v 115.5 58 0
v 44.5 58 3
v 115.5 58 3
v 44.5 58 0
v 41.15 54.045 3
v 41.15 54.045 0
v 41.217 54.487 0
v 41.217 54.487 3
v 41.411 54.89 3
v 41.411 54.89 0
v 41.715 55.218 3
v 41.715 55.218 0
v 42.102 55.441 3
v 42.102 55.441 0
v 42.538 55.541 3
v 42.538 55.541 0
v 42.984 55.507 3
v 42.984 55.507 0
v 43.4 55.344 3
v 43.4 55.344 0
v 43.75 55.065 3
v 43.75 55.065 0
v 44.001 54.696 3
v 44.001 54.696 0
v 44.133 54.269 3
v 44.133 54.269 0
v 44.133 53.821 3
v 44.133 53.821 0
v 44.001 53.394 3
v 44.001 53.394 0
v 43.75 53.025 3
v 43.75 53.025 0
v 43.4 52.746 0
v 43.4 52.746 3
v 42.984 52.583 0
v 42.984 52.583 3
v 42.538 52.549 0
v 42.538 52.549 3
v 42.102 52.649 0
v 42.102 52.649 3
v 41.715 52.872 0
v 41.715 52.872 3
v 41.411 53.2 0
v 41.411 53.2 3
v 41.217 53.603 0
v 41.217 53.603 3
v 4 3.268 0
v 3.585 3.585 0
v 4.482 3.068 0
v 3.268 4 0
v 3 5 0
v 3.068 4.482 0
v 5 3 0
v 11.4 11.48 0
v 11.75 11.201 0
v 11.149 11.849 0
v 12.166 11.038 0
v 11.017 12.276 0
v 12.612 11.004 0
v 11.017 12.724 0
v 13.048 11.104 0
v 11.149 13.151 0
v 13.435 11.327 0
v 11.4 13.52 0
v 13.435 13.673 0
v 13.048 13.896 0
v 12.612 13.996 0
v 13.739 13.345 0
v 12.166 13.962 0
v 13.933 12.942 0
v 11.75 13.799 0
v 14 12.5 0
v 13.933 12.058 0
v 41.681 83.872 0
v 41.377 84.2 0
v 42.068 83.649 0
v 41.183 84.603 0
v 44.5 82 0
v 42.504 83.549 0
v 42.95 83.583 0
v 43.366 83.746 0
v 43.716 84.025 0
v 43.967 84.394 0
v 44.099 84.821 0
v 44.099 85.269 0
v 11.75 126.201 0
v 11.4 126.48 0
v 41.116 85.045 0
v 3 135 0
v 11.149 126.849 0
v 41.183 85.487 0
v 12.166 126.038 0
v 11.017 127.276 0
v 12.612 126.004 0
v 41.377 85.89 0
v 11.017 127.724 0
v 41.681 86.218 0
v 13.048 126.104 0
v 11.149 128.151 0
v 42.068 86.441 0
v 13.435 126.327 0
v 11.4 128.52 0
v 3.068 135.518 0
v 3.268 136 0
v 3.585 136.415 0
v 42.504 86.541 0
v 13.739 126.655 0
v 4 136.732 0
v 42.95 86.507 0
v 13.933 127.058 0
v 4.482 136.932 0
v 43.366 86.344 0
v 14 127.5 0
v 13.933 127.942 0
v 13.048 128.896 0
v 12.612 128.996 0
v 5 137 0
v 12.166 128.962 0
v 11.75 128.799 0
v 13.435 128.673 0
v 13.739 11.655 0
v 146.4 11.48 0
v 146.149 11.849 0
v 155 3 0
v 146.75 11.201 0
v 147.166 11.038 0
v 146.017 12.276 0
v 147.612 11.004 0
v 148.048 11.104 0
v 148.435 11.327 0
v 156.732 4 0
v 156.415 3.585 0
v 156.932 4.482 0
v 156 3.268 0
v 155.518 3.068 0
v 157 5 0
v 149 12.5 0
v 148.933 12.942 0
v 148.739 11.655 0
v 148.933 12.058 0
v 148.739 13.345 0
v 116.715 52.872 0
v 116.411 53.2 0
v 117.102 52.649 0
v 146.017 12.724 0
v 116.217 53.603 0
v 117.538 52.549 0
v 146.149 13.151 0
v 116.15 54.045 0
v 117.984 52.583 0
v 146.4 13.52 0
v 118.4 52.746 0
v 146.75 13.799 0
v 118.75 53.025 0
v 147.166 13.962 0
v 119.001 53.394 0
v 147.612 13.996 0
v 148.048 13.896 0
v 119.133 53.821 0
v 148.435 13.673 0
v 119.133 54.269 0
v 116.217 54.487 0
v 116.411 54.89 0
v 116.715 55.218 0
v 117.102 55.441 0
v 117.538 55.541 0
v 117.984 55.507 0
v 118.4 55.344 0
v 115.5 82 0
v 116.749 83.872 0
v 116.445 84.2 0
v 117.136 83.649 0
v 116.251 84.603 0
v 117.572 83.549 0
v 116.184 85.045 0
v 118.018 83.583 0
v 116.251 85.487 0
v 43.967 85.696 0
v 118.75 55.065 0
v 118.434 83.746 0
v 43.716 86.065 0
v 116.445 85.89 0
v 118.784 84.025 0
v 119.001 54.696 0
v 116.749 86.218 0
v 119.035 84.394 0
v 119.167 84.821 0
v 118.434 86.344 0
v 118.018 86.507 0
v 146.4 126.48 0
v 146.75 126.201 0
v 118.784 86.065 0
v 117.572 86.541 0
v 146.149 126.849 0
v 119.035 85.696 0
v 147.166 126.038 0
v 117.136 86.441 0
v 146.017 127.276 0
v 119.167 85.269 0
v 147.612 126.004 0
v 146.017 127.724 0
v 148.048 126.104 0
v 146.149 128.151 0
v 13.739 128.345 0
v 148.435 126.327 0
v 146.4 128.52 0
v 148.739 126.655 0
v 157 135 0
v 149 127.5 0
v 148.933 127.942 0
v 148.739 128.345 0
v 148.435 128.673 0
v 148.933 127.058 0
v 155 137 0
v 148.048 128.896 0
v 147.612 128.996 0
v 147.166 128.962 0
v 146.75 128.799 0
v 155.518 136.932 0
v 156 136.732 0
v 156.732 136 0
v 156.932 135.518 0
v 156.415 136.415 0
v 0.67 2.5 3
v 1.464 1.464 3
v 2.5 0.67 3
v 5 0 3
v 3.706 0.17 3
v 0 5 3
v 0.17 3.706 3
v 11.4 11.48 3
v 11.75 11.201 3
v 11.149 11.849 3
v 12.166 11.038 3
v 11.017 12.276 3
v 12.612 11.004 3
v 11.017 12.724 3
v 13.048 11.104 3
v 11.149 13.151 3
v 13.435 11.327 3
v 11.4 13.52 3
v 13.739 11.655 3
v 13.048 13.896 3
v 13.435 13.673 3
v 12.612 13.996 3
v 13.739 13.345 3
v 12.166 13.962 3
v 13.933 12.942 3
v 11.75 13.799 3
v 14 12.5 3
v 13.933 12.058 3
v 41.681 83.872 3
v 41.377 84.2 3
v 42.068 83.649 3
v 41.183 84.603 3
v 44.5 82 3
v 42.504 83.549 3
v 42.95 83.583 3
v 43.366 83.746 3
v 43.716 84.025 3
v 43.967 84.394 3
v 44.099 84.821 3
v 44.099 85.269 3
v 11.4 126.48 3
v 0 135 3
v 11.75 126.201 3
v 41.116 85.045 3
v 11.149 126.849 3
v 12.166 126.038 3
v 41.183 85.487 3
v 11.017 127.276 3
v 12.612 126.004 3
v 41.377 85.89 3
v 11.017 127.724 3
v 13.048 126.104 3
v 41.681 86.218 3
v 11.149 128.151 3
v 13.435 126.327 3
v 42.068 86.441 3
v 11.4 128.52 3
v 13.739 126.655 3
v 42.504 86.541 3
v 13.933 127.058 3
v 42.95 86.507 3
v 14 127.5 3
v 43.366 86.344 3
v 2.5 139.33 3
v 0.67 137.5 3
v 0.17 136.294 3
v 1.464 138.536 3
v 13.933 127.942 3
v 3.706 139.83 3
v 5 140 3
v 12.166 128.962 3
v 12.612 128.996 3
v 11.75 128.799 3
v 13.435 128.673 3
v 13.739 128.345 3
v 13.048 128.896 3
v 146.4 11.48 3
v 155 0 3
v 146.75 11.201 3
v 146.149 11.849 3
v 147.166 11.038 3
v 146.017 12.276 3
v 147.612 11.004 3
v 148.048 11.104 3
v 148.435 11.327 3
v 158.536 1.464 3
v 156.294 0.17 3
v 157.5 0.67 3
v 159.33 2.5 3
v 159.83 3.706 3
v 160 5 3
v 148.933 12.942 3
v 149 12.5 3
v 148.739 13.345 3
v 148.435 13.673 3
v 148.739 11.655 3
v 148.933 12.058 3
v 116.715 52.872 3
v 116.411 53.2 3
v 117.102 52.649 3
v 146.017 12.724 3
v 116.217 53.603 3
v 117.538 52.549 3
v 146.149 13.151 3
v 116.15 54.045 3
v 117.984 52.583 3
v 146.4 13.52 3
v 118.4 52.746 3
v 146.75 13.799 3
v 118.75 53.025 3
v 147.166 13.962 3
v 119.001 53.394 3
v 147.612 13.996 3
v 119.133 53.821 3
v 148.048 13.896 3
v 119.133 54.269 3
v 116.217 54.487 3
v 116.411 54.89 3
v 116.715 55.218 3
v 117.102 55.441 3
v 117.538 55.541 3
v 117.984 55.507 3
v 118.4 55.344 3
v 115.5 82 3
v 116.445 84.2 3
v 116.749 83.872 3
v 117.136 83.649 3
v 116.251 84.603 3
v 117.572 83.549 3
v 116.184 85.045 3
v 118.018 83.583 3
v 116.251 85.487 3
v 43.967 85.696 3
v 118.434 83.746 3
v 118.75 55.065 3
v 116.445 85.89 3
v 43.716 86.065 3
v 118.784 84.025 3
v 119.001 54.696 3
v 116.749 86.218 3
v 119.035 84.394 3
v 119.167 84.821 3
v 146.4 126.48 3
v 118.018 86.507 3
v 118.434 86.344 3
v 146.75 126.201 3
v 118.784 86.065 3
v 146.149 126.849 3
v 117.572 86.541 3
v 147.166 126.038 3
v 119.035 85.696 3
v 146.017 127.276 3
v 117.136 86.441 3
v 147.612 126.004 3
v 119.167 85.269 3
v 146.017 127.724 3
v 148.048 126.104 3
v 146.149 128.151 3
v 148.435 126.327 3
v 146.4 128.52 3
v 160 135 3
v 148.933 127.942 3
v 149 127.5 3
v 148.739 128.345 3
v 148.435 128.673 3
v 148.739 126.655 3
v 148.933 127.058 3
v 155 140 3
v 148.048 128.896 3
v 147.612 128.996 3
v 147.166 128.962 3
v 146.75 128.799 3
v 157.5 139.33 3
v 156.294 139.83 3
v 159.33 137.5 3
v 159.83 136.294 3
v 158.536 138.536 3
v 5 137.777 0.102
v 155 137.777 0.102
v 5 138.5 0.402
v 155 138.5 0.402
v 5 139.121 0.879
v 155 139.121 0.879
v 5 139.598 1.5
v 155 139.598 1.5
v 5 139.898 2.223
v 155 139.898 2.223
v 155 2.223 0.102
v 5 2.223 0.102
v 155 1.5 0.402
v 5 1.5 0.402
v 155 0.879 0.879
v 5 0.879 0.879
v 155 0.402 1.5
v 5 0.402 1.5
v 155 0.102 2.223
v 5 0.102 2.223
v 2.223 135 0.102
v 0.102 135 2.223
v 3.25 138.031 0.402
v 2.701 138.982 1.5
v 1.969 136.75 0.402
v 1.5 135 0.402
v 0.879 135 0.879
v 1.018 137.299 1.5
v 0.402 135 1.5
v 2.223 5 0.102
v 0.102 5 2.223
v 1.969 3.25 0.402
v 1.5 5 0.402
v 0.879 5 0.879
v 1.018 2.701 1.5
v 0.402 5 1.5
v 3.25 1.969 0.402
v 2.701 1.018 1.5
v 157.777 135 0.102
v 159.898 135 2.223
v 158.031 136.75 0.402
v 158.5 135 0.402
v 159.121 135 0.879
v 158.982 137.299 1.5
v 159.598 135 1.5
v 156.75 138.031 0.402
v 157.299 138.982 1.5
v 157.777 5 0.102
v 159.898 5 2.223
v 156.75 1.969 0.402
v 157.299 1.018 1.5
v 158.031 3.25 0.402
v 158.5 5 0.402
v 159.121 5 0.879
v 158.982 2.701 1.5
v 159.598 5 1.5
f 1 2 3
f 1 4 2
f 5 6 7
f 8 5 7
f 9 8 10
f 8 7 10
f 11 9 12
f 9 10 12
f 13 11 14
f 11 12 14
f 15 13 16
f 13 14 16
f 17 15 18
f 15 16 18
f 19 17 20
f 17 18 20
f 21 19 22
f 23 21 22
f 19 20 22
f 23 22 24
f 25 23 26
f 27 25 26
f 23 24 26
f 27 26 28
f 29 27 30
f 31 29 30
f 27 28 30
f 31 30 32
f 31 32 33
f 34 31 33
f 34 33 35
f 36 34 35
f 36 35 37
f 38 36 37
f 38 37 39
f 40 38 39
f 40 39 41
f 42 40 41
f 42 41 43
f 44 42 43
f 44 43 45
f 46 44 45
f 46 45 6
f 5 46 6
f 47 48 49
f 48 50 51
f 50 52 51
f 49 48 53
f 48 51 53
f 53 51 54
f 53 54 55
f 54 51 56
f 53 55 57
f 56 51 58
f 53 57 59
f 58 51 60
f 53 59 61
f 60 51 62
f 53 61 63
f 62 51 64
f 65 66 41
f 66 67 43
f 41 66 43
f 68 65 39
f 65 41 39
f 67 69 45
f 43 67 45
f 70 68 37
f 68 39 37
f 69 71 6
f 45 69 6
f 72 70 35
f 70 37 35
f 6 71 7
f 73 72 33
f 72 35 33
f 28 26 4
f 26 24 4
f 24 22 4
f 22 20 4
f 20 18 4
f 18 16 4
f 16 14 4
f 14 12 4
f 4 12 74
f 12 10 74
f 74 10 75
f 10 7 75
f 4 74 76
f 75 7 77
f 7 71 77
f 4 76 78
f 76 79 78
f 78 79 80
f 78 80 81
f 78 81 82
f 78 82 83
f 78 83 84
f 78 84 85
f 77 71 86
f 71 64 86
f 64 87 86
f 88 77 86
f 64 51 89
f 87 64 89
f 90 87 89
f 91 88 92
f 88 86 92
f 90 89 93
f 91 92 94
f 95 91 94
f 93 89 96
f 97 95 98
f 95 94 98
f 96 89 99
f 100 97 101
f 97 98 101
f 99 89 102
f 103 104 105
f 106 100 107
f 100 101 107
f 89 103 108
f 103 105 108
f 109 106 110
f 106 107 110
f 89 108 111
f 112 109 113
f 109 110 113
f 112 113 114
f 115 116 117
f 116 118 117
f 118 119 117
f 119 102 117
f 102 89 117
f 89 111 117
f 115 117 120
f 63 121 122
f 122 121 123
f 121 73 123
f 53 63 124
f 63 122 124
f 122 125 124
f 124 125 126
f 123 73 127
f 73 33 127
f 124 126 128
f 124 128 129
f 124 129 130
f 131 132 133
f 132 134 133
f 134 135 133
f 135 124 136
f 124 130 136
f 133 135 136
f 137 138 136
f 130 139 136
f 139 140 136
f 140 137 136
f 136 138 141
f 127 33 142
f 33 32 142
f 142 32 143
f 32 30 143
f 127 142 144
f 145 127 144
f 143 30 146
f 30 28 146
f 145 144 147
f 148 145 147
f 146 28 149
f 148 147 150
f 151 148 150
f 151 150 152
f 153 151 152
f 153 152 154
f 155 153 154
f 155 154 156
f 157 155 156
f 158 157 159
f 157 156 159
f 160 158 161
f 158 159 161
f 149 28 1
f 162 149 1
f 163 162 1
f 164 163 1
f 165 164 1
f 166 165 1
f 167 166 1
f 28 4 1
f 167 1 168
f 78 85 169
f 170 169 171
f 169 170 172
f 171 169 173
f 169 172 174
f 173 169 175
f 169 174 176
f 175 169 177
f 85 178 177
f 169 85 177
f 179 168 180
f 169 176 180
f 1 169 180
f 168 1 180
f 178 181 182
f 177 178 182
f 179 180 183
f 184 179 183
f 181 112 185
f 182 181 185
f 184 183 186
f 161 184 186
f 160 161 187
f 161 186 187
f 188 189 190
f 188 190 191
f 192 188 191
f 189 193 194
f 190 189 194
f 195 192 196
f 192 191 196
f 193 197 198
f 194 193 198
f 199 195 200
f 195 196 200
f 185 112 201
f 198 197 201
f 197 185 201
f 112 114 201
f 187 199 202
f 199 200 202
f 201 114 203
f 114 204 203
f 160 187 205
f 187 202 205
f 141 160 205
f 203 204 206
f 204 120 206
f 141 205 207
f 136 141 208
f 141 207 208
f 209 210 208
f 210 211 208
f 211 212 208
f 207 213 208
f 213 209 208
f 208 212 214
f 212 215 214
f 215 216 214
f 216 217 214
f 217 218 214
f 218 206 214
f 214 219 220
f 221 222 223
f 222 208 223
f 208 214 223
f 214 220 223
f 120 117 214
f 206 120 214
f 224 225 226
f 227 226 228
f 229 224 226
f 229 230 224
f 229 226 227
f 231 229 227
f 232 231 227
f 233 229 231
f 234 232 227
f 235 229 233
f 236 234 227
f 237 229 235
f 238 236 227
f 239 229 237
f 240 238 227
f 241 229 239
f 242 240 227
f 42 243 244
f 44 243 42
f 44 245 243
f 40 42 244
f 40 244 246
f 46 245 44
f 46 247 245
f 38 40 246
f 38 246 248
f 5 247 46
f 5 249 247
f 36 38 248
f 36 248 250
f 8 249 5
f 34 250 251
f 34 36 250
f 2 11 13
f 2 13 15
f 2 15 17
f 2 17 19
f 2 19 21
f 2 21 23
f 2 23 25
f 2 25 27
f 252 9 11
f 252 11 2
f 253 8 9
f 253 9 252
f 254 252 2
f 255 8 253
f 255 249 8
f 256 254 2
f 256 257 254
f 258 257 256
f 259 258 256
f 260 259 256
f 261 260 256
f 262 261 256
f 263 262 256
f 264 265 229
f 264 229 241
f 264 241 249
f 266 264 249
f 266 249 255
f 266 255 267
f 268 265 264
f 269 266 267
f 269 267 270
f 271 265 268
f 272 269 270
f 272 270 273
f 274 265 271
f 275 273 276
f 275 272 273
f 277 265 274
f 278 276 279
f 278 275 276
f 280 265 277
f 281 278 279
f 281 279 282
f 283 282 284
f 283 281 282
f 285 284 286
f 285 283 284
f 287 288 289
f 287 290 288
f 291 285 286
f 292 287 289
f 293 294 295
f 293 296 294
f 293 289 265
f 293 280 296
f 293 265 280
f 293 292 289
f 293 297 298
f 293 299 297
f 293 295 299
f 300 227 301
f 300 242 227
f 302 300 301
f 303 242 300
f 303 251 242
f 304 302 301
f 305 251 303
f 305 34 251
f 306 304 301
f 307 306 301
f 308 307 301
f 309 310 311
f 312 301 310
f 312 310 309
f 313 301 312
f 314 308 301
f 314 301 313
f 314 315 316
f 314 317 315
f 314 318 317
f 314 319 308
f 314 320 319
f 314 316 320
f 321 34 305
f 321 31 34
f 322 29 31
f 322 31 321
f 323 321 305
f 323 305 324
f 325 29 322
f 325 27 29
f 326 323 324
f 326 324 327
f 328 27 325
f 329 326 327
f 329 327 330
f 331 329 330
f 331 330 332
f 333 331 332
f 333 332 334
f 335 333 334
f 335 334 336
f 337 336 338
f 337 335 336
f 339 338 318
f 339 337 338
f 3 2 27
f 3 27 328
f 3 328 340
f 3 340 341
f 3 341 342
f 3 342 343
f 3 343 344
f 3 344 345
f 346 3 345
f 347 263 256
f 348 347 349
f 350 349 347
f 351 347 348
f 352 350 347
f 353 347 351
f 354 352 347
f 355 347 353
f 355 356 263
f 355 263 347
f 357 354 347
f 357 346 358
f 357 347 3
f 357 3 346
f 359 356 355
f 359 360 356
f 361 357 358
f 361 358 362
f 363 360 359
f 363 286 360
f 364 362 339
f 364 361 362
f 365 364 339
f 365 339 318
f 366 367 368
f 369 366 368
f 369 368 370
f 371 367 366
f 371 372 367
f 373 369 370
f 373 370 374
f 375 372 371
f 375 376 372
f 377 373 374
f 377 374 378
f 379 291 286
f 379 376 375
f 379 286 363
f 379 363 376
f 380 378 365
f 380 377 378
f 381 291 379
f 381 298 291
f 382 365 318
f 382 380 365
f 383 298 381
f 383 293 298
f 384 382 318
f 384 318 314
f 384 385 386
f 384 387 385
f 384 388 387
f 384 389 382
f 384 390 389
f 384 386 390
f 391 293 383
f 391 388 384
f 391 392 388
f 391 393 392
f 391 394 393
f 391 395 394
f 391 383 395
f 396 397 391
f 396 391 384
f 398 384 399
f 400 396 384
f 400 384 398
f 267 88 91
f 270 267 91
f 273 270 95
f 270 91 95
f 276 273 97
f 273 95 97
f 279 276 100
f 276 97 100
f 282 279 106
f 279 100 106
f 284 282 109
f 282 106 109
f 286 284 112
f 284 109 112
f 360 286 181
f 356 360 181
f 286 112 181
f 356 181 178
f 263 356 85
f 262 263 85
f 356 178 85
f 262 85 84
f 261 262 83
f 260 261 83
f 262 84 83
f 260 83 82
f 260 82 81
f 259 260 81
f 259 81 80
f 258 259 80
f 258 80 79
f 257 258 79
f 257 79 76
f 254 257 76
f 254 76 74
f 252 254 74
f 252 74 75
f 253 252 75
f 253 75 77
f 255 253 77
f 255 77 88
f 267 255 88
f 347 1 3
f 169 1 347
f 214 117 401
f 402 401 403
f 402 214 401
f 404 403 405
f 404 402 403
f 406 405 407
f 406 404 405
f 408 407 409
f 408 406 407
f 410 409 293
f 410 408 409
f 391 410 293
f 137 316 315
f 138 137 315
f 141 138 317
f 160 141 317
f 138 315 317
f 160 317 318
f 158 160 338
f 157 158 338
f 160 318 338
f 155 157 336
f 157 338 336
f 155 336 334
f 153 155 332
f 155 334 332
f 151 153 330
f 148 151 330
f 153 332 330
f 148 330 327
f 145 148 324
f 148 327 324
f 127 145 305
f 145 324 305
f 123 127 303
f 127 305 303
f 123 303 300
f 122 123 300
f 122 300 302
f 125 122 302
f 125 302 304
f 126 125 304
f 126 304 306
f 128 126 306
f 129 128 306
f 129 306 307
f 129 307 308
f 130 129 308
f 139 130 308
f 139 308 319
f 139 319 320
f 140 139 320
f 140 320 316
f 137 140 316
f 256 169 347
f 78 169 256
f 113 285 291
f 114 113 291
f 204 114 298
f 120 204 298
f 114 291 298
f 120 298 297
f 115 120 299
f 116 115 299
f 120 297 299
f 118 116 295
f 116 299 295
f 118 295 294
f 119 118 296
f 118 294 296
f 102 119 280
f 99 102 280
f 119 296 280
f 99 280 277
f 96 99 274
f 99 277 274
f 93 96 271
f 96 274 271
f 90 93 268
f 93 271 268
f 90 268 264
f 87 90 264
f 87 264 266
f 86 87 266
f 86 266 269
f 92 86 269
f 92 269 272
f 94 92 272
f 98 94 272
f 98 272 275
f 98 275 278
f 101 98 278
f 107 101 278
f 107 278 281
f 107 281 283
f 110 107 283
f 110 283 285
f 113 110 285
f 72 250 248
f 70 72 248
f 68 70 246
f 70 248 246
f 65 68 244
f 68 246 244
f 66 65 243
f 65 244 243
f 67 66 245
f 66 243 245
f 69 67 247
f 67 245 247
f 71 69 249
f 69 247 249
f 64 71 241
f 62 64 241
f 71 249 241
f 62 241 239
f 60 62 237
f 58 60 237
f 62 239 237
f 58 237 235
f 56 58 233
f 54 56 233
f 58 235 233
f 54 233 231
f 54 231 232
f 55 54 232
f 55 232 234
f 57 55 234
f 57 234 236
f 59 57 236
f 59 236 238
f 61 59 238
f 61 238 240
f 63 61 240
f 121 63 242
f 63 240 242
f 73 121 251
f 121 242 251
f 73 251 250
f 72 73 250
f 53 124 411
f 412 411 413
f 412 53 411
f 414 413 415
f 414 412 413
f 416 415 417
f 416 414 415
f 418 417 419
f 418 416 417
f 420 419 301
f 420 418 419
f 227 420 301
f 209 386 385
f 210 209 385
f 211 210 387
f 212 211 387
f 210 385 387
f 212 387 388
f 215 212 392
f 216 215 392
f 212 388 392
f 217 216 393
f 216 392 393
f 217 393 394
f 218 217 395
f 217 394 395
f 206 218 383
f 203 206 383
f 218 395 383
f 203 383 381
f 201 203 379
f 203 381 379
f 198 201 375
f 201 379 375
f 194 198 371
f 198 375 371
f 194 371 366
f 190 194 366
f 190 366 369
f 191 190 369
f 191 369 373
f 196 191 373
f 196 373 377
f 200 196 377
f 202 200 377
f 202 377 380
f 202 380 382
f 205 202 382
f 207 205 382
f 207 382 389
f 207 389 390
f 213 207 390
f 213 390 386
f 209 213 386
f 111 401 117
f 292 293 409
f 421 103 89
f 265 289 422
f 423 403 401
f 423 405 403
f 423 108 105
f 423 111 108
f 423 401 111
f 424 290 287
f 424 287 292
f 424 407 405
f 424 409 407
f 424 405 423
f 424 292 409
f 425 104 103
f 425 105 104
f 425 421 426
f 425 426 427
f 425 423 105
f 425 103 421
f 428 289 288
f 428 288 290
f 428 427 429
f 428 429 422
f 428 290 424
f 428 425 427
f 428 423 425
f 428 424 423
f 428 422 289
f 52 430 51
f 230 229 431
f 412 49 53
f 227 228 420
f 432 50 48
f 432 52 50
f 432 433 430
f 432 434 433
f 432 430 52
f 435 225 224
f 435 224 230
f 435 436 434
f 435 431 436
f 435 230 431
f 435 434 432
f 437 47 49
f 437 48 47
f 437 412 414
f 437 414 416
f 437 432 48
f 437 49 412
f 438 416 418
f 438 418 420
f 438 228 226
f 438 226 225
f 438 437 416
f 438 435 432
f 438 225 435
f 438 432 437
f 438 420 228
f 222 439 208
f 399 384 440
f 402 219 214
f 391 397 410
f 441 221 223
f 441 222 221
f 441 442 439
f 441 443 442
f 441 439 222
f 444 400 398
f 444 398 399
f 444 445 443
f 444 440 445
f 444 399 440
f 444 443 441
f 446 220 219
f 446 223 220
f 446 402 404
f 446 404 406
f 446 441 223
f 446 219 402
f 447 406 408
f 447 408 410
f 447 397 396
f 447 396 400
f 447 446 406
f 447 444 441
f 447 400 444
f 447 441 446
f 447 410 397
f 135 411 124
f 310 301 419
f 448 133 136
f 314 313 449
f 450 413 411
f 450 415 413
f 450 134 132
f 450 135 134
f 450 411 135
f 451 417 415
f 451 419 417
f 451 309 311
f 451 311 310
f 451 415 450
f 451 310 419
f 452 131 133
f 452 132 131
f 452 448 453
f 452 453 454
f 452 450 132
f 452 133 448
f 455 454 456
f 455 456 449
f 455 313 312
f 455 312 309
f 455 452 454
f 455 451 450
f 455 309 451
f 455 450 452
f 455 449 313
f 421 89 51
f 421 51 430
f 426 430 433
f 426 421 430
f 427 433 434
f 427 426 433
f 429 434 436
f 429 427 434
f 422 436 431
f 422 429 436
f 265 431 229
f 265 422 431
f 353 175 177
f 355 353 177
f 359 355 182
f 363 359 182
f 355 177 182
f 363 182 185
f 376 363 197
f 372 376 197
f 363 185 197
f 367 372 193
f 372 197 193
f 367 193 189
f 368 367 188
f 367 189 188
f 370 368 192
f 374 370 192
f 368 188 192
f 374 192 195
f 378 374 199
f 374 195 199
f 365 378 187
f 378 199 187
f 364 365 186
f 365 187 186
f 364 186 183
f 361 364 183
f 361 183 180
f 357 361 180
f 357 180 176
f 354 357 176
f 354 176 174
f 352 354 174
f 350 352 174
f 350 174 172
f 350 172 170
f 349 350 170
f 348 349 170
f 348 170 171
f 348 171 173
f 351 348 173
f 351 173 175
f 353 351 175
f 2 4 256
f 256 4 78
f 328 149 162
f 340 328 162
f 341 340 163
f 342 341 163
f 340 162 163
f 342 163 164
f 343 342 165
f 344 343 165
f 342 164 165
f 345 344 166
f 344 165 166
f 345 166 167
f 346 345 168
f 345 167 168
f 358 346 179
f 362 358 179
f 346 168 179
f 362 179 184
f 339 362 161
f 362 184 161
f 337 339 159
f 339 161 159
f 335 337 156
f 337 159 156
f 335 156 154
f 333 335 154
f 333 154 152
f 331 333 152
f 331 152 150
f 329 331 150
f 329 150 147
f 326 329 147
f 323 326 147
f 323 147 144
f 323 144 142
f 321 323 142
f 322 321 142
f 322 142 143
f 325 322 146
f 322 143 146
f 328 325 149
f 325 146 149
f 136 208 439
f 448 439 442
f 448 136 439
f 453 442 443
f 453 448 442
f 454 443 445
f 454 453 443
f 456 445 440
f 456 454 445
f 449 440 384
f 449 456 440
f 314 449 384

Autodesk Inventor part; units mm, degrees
ref_plane "YZ Plane" through (0, 0, 0) normal (1, 0, 0) x (0, 1, 0)
ref_plane "XZ Plane" through (0, 0, 0) normal (0, 1, 0) x (-1, 0, 0)
ref_plane "XY Plane" through (0, 0, 0) normal (0, 0, 1) x (1, 0, 0)
sketch "Sketch1" plane through (0, 0, 0) normal (0, 0, 1) x (1, 0, 0)
  line L0 (0, 0) -> (160, 0)
  line L1 (160, 0) -> (160, 140)
  line L2 (160, 140) -> (0, 140)
  line L3 (0, 140) -> (0, 0)
  dimension "d0" = 160
  dimension "d1" = 140
extrude "Extrusion1" add sketch "Sketch1" along normal blind 3
fillet "Fillet1" radius 5 4 edges at (160, 140, 1.5) (0, 140, 1.5) (0, 0, 1.5) (160, 0, 1.5)
sketch "Sketch2" plane through (0, 0, 3) normal (0, 0, 1) x (1, 0, 0)
  arc A0 (155, 0) -> (160, 5) centre (155, 5) ccw projected
  line L0 (160, 5) -> (160, 135) projected
  arc A1 (160, 135) -> (155, 140) centre (155, 135) ccw projected
  line L1 (155, 140) -> (5, 140) projected
  arc A2 (5, 140) -> (0, 135) centre (5, 135) ccw projected
  line L2 (0, 135) -> (0, 5) projected
  arc A3 (0, 5) -> (5, 0) centre (5, 5) ccw projected
  line L3 (5, 0) -> (155, 0) projected
  line L4 (0, 0) -> (12.5, 0)
  line L5 (12.5, 0) -> (12.5, 12.5)
  line L6 (12.5, 12.5) -> (0, 12.5)
  line L7 (0, 12.5) -> (0, 0)
  circle A4 centre (12.5, 12.5) radius 1.5
  line L8 (80, 0) -> (80, 5)
  line L9 (0, 70) -> (5, 70)
  circle A5 centre (147.5, 12.5) radius 1.5
  circle A6 centre (12.5, 127.5) radius 1.5
  circle A7 centre (147.5, 127.5) radius 1.5
  dimension "d5" = 12.5
  dimension "d6" = 12.5
  dimension "d7" = 3
  dimension "d8" = 5
  dimension "d9" = 5
extrude "Extrusion2" cut sketch "Sketch2" against normal through all contours A4 L6 L5 | L5 L6 A4 | A5 | A6 | A7
fillet "Fillet2" radius 3 8 edges at (1.4645, 138.5355, 0) (0, 70, 0) (1.4645, 1.4645, 0) (80, 0, 0) (158.5355, 1.4645, 0) (160, 70, 0) (158.5355, 138.5355, 0) (80, 140, 0)
sketch "Sketch3" plane through (0, 0, 0) normal (0, 0, -1) x (-1, 0, 0)
  line L0 (-155, 140) -> (-5, 140) projected
  line L1 (-5, 0) -> (-155, 0) projected
  line L2 (-160, 5) -> (-160, 135) projected
  line L3 (0, 135) -> (0, 5) projected
  line L4 (-80, 0) -> (-80, 58)
  line L5 (-80, 58) -> (-115.5, 58)
  line L6 (-115.5, 58) -> (-115.5, 82)
  line L7 (-115.5, 82) -> (-80, 82)
  line L8 (-80, 82) -> (-80, 58)
  line L9 (-80, 58) -> (-44.5, 58)
  line L10 (-44.5, 58) -> (-44.5, 82)
  line L11 (-44.5, 82) -> (-80, 82)
  point P0 (0, 0)
  dimension "d13" = 58
  dimension "d14" = 35.5
  dimension "d15" = 24
extrude "Extrusion3" cut sketch "Sketch3" against normal blind 10
sketch "Sketch4" plane through (0, 0, 0) normal (0, 0, -1) x (-1, 0, 0)
  line L0 (-44.5, 58) -> (-115.5, 58) projected
  line L1 (-115.5, 58) -> (-115.5, 82) projected
  line L2 (-115.5, 82) -> (-44.5, 82) projected
  line L3 (-44.5, 82) -> (-44.5, 58) projected
  circle A0 centre (-12.5, 127.5) radius 1.5 projected
  circle A1 centre (-147.5, 12.5) radius 1.5 projected
  circle A2 centre (-147.5, 127.5) radius 1.5 projected
  circle A3 centre (-12.5, 12.5) radius 1.5 projected
  arc A4 (-3, 135) -> (-5, 137) centre (-5, 135) ccw projected
  line L4 (-155, 137) -> (-5, 137) projected
  arc A5 (-155, 137) -> (-157, 135) centre (-155, 135) ccw projected
  line L5 (-157, 5) -> (-157, 135) projected
  arc A6 (-157, 5) -> (-155, 3) centre (-155, 5) ccw projected
  line L6 (-5, 3) -> (-155, 3) projected
  arc A7 (-5, 3) -> (-3, 5) centre (-5, 5) ccw projected
  line L7 (-3, 135) -> (-3, 5) projected
  line L8 (-120.15, 87.8) -> (-40.15, 87.8)
  line L9 (-40.15, 51.8) -> (-120.15, 51.8)
  line L10 (-40.15, 51.8) -> (-40.15, 87.8)
  line L11 (-120.15, 51.8) -> (-120.15, 87.8)
  line L12 (-40.15, 51.8) -> (-42.65, 51.8)
  line L13 (-42.65, 51.8) -> (-42.65, 54.045)
  line L14 (-42.65, 54.045) -> (-40.15, 54.045)
  line L15 (-40.15, 54.045) -> (-40.15, 51.8)
  line L16 (-80.15, 51.8) -> (-80.15, 56.8)
  circle A8 centre (-42.65, 54.045) radius 1.5
  circle A9 centre (-117.65, 54.045) radius 1.5
  line L17 (-40.15, 87.8) -> (-42.616, 87.8)
  line L18 (-42.616, 87.8) -> (-42.616, 85.045)
  line L19 (-42.616, 85.045) -> (-40.15, 85.045)
  line L20 (-40.15, 85.045) -> (-40.15, 87.8)
  circle A10 centre (-42.616, 85.045) radius 1.5
  circle A11 centre (-117.684, 85.045) radius 1.5
  point P0 (0, 0)
  dimension "d18" = 5.8
  dimension "d19" = 6.2
  dimension "d20" = 4.35
  dimension "d21" = 4.65
  dimension "d22" = 2.5
  dimension "d23" = 2.245
  dimension "d24" = 5
  dimension "d25" = 3
  dimension "d26" = 2.466
  dimension "d27" = 2.755
  dimension "d28" = 3
extrude "Extrusion4" cut sketch "Sketch4" against normal blind 10 contours A10 L19 L18 | L18 L19 A10 | A8 L14 L13 | L13 L14 A8 | A9 | A11
properties part number "TutupBox"
